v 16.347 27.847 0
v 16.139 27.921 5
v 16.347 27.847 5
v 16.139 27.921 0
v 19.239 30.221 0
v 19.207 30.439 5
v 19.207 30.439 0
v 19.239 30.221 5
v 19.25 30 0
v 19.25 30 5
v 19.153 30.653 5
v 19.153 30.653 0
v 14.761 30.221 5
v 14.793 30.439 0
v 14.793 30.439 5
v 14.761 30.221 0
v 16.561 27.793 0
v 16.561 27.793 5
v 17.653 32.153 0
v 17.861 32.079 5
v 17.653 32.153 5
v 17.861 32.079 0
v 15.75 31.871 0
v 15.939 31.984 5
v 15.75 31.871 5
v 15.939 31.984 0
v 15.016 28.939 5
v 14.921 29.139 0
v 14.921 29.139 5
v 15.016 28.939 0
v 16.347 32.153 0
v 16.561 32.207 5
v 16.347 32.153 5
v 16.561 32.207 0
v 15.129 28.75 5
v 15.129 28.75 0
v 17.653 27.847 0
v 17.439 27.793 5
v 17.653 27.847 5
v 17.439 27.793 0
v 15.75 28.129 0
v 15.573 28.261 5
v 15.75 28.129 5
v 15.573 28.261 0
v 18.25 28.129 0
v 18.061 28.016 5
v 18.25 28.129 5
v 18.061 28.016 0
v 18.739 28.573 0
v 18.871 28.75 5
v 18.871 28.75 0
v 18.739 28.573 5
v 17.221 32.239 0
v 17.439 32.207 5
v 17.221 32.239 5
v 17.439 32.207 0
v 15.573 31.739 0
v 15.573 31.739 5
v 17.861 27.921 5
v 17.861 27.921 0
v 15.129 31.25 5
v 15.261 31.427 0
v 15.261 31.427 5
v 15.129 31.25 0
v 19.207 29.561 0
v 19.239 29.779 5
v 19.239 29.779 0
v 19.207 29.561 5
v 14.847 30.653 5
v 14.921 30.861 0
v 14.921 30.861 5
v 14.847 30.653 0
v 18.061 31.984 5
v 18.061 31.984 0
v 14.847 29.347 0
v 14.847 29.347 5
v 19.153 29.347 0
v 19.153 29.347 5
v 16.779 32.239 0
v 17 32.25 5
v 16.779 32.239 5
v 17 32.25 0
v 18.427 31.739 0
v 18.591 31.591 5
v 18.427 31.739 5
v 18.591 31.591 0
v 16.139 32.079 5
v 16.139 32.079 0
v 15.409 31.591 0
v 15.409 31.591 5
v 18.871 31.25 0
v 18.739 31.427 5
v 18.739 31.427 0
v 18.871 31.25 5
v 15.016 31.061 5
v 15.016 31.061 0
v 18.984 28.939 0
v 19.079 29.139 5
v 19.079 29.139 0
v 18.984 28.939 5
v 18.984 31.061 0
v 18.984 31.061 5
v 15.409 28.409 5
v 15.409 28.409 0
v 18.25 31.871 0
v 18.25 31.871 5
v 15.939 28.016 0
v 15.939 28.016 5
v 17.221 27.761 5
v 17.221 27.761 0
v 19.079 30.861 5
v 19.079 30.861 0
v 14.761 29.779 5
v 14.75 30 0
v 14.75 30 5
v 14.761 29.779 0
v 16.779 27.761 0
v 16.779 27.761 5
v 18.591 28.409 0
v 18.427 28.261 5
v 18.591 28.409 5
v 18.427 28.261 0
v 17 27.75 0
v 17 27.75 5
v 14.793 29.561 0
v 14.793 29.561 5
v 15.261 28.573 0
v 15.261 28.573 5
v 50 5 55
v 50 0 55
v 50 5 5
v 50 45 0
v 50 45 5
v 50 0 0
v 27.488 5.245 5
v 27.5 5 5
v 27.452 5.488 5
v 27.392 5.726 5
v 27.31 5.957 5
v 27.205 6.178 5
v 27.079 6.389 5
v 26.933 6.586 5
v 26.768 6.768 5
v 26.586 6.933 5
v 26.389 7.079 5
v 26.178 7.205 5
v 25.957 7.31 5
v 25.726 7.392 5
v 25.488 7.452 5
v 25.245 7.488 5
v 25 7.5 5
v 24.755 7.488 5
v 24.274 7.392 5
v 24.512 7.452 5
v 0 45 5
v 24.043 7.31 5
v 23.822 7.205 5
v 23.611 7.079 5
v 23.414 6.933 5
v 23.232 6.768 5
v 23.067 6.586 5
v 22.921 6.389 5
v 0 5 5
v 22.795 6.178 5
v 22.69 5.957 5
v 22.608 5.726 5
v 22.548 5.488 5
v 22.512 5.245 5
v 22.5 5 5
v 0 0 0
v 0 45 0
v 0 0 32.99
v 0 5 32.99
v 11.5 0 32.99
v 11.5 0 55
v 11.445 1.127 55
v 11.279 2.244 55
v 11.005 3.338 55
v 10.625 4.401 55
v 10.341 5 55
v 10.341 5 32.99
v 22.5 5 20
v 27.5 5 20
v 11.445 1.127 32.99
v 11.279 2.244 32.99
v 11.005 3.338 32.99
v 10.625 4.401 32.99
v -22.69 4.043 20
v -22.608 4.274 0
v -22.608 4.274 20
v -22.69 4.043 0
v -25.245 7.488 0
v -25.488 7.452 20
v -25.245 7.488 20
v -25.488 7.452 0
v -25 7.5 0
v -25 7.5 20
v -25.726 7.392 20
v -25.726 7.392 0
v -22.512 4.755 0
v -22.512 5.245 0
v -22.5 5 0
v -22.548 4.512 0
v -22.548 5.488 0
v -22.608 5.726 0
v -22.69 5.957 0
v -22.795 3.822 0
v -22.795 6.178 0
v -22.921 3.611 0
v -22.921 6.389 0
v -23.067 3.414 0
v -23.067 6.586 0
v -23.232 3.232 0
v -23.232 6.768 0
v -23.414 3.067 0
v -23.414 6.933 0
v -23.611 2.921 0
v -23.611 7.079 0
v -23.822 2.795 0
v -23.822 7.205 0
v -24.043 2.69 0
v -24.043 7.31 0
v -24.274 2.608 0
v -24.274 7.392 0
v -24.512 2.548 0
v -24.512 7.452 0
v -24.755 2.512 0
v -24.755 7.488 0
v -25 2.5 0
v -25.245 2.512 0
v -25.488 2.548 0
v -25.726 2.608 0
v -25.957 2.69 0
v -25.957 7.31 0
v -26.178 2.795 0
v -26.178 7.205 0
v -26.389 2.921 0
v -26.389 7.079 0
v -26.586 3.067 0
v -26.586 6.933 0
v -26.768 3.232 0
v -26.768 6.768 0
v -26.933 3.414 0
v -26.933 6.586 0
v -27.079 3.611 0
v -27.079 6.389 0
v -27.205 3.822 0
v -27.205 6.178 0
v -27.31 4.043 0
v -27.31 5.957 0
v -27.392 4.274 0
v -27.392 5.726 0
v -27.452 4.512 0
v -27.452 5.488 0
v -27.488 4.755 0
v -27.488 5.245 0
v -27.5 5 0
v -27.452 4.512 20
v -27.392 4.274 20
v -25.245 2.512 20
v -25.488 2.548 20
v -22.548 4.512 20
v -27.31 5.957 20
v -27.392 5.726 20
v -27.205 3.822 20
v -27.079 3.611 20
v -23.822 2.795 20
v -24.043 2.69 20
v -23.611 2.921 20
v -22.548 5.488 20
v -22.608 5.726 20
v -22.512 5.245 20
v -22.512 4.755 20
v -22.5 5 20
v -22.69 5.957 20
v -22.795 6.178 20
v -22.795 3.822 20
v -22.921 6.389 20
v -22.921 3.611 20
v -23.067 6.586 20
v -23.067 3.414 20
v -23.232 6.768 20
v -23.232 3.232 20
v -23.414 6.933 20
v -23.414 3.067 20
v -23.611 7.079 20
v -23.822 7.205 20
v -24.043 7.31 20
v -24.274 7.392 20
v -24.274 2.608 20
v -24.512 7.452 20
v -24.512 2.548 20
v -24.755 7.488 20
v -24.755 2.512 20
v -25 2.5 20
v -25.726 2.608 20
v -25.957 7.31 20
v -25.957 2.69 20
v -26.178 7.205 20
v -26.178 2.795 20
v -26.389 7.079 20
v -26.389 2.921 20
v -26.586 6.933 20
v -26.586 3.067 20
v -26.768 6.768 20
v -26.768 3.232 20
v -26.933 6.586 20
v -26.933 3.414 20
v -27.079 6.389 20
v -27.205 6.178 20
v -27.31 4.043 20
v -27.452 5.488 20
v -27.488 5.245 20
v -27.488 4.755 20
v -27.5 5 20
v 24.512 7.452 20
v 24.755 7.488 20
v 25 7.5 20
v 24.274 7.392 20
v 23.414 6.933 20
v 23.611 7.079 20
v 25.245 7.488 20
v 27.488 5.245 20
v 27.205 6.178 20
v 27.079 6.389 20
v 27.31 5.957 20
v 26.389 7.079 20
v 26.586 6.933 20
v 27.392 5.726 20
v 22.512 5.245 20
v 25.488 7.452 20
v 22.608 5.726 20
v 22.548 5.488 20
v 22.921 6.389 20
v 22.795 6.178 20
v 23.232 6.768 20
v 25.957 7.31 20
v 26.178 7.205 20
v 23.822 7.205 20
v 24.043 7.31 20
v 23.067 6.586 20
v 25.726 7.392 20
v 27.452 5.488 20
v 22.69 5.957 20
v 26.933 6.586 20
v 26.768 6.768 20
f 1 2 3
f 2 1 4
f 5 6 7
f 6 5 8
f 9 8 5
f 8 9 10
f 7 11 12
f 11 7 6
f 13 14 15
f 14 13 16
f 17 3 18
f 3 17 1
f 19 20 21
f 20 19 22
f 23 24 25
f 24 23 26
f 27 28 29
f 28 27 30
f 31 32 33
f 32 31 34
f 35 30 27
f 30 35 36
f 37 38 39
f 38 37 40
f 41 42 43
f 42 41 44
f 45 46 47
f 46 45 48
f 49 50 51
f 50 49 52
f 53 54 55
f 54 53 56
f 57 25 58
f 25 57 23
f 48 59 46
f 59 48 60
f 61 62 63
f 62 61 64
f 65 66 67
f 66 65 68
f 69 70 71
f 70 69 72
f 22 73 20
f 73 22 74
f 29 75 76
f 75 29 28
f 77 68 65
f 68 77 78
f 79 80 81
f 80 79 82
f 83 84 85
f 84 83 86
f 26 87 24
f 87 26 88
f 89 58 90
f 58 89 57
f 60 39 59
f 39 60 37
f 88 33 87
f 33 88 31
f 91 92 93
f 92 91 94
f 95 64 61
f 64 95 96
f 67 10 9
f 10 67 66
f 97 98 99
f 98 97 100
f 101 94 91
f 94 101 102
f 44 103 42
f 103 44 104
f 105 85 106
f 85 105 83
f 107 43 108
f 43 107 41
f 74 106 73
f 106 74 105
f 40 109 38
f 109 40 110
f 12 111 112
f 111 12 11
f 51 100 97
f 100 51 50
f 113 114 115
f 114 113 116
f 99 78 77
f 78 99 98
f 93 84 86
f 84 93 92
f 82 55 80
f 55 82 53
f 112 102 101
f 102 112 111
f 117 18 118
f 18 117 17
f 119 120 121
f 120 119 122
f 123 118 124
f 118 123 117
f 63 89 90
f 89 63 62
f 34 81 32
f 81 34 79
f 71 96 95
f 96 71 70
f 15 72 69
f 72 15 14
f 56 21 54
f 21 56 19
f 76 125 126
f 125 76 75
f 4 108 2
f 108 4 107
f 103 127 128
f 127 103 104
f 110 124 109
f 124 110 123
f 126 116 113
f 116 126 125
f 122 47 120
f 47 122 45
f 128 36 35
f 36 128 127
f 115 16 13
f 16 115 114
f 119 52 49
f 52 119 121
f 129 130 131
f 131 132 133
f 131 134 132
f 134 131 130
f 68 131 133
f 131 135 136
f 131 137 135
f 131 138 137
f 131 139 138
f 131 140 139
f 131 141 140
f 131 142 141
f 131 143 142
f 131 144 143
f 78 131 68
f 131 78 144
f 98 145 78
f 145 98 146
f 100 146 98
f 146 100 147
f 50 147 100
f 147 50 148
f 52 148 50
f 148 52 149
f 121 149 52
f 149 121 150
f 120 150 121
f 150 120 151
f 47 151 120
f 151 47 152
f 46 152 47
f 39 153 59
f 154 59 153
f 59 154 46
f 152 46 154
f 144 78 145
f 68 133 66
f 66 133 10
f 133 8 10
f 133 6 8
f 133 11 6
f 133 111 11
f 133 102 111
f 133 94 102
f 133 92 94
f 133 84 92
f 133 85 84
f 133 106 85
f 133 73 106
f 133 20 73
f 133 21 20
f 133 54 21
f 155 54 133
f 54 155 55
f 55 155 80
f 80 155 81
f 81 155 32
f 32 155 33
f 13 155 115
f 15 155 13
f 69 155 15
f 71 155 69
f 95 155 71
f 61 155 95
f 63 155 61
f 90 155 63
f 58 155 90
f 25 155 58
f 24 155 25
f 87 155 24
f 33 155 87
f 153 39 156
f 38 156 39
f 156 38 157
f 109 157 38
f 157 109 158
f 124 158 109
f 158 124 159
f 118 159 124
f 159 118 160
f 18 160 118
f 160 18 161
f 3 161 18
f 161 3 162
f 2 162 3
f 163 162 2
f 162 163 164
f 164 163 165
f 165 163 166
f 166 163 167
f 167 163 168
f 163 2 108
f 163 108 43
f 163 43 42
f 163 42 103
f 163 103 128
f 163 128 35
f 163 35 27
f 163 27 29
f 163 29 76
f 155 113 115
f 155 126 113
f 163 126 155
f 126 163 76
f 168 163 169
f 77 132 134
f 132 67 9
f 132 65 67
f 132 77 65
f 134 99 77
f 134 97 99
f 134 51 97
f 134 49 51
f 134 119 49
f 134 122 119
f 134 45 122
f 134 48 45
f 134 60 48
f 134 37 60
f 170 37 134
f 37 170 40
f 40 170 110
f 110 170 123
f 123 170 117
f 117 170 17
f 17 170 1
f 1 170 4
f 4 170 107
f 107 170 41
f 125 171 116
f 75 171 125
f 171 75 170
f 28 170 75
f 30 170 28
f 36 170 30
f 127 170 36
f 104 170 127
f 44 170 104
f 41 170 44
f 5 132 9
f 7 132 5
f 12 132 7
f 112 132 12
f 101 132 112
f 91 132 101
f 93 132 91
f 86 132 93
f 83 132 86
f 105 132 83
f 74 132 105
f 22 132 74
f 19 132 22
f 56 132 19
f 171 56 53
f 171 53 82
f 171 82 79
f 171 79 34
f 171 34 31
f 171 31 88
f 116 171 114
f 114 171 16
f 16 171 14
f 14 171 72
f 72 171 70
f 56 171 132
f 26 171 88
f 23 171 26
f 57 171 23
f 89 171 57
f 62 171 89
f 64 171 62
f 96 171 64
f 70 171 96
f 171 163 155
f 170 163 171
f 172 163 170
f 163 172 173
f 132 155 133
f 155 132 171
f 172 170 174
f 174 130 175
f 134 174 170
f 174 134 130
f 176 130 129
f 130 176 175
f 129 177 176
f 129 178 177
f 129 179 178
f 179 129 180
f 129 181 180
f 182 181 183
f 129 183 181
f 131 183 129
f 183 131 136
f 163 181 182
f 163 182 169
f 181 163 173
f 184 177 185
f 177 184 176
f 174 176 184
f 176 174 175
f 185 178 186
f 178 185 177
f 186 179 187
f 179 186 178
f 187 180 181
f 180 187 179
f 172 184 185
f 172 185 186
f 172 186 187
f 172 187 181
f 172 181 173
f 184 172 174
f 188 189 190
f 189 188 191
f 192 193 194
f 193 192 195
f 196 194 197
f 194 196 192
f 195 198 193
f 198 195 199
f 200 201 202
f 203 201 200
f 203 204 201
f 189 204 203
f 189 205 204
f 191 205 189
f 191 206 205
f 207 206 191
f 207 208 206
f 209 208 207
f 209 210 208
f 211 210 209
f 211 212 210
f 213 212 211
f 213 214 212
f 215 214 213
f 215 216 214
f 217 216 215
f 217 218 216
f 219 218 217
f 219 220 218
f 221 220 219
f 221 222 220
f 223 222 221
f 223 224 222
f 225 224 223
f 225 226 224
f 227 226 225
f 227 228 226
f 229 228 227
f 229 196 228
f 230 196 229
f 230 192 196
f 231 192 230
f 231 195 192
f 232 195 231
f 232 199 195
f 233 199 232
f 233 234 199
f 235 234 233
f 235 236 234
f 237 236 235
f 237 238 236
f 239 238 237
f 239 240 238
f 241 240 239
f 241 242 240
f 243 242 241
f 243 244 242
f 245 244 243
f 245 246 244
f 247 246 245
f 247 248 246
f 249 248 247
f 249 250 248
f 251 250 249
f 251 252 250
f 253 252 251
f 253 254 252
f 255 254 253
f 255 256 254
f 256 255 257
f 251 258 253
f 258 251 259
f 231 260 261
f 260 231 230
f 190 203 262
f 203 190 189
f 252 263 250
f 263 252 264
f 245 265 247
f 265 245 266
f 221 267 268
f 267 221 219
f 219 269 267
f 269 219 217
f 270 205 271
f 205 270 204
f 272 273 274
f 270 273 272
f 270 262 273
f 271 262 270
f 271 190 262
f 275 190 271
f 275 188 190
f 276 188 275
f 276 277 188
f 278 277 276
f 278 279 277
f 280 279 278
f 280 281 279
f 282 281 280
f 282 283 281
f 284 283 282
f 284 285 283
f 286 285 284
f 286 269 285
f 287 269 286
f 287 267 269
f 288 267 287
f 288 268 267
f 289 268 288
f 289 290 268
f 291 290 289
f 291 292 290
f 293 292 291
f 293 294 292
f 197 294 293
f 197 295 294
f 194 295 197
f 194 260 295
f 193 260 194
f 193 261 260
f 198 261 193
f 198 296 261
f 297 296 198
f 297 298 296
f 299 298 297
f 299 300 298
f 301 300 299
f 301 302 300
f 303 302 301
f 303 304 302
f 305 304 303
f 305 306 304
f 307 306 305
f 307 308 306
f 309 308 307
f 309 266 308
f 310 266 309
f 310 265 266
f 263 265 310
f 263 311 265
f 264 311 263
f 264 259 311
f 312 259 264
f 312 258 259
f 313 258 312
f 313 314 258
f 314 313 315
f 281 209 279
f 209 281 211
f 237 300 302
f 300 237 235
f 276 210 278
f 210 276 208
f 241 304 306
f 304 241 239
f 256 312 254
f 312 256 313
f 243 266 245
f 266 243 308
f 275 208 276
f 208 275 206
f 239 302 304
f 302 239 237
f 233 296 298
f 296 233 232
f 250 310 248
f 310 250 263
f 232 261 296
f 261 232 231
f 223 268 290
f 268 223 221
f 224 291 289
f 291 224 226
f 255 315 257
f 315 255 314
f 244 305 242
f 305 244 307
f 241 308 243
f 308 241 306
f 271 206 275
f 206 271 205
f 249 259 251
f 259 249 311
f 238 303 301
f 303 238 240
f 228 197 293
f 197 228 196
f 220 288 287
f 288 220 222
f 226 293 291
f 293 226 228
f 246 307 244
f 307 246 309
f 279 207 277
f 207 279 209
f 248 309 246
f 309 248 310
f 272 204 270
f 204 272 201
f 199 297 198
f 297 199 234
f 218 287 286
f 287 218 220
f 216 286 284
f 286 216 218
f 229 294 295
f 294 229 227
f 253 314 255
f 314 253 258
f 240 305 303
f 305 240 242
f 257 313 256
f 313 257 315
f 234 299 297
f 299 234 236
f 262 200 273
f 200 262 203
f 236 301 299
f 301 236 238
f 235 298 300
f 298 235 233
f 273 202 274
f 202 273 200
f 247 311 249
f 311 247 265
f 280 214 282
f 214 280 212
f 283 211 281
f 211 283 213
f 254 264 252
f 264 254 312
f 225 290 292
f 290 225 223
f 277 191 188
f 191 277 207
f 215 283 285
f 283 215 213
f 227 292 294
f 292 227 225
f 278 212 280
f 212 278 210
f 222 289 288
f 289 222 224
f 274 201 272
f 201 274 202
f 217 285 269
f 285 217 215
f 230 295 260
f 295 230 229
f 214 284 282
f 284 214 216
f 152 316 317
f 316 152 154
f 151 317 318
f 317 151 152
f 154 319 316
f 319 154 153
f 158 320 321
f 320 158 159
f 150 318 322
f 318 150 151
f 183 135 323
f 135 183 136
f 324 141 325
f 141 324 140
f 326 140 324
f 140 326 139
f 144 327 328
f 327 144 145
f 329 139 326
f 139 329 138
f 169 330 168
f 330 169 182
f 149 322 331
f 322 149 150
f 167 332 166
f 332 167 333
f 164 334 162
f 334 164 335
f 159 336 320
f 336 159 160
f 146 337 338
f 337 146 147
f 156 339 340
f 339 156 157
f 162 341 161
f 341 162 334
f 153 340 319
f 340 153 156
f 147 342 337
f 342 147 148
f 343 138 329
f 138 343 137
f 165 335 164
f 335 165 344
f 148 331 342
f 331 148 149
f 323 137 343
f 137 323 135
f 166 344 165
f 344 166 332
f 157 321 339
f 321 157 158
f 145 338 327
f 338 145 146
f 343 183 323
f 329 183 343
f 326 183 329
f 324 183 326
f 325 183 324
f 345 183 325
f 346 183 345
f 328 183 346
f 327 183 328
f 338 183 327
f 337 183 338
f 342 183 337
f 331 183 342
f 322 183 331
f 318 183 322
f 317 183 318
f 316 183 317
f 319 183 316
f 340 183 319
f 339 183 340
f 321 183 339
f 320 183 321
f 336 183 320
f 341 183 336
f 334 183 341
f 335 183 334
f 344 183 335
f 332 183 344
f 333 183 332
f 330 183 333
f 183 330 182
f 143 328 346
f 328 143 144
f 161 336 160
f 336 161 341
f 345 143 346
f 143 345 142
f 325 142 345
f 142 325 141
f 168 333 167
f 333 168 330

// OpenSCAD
$fn = 64;

// --- Dimensions (mm) ---
base_x_len = 50;       // -25 to 25
base_y_len = 45;       // 0 to 45
base_z_thick = 5;      // 0 to 5

motor_plate_x_len = 50; // -25 to 25
motor_plate_y_len = 5;  // 0 to 5
motor_plate_z_len = 50; // 0 to 50

hole_m4_dia = 4.5;
hole_m4_pos_x = [-17, 17];
hole_m4_pos_y = 30;

hole_motor_boss_dia = 23;
hole_motor_boss_z = 28;

hole_m3_dia = 3.4;
hole_m3_spacing = 31; // Square pattern side length
hole_m3_z = 28;        // Same height as boss hole

gusset_thick = 5;
gusset_y_len = 20;
gusset_z_len = 20;
gusset_x_start = -25;
gusset_x_end = -20;
gusset_x_start_right = 20;
gusset_x_end_right = 25;

// --- Geometry ---

// Base Plate
module base_plate() {
    difference() {
        // Main block
        cube([base_x_len, base_y_len, base_z_thick], center=false);
        
        // M4 Holes
        for (x = hole_m4_pos_x) {
            translate([x, hole_m4_pos_y, -0.01])
            cylinder(d = hole_m4_dia, h = base_z_thick + 0.02, center=false);
        }
    }
}

// Vertical Motor Plate
module motor_plate() {
    difference() {
        // Main block
        cube([motor_plate_x_len, motor_plate_y_len, motor_plate_z_len], center=false);
        
        // Motor Boss Hole (23mm)
        translate([0, 0, hole_motor_boss_z - 0.01])
        cylinder(d = hole_motor_boss_dia, h = motor_plate_z_len + 0.02, center=false);
        
        // M3 Screw Holes (31mm square pattern)
        // Calculate offsets from center (0,0) to corners of the square
        // Pattern is centered at x=0, y=0 relative to the plate
        let(offset = hole_m3_spacing / 2) {
            for (x = [-offset, offset]) {
                for (y = [-offset, offset]) {
                    translate([x, y, hole_m3_z - 0.01])
                    cylinder(d = hole_m3_dia, h = motor_plate_z_len + 0.02, center=false);
                }
            }
        }
    }
}

// Gussets
module gusset(x_start, x_end) {
    // Right triangle in YZ plane
    // Right angle corner at y=5, z=5
    // Legs: 20mm along +Y, 20mm along +Z
    // The hypotenuse connects (y=5, z=25) to (y=25, z=5)
    
    // Using polygon to define the triangle shape
    polygon([
        [0, 0], // Bottom-Left (0,0)
        [x_end - x_start, 0], // Bottom-Right (thickness, 0)
        [x_end - x_start, gusset_z_len], // Top-Right (thickness, 20)
        [0, gusset_z_len]  // Top-Left (0, 20)
    ]);
}

module gussets() {
    // Left Gusset
    translate([gusset_x_start, 0, 0])
    rotate([0, 0, 90])
    translate([gusset_thick, 0, 0])
    color("red") // Visual aid only
    cylinder(d = gusset_thick, h = gusset_y_len, center=false);
    
    // Right Gusset
    translate([gusset_x_end_right, 0, 0])
    rotate([0, 0, 90])
    translate([gusset_thick, 0, 0])
    color("red") // Visual aid only
    cylinder(d = gusset_thick, h = gusset_y_len, center=false);
}

// Assembly
union() {
    base_plate();
    
    // Motor Plate positioned on the back edge (y=0) of the base
    translate([0, 0, base_z_thick])
    motor_plate();
    
    // Gussets
    gussets();
}
